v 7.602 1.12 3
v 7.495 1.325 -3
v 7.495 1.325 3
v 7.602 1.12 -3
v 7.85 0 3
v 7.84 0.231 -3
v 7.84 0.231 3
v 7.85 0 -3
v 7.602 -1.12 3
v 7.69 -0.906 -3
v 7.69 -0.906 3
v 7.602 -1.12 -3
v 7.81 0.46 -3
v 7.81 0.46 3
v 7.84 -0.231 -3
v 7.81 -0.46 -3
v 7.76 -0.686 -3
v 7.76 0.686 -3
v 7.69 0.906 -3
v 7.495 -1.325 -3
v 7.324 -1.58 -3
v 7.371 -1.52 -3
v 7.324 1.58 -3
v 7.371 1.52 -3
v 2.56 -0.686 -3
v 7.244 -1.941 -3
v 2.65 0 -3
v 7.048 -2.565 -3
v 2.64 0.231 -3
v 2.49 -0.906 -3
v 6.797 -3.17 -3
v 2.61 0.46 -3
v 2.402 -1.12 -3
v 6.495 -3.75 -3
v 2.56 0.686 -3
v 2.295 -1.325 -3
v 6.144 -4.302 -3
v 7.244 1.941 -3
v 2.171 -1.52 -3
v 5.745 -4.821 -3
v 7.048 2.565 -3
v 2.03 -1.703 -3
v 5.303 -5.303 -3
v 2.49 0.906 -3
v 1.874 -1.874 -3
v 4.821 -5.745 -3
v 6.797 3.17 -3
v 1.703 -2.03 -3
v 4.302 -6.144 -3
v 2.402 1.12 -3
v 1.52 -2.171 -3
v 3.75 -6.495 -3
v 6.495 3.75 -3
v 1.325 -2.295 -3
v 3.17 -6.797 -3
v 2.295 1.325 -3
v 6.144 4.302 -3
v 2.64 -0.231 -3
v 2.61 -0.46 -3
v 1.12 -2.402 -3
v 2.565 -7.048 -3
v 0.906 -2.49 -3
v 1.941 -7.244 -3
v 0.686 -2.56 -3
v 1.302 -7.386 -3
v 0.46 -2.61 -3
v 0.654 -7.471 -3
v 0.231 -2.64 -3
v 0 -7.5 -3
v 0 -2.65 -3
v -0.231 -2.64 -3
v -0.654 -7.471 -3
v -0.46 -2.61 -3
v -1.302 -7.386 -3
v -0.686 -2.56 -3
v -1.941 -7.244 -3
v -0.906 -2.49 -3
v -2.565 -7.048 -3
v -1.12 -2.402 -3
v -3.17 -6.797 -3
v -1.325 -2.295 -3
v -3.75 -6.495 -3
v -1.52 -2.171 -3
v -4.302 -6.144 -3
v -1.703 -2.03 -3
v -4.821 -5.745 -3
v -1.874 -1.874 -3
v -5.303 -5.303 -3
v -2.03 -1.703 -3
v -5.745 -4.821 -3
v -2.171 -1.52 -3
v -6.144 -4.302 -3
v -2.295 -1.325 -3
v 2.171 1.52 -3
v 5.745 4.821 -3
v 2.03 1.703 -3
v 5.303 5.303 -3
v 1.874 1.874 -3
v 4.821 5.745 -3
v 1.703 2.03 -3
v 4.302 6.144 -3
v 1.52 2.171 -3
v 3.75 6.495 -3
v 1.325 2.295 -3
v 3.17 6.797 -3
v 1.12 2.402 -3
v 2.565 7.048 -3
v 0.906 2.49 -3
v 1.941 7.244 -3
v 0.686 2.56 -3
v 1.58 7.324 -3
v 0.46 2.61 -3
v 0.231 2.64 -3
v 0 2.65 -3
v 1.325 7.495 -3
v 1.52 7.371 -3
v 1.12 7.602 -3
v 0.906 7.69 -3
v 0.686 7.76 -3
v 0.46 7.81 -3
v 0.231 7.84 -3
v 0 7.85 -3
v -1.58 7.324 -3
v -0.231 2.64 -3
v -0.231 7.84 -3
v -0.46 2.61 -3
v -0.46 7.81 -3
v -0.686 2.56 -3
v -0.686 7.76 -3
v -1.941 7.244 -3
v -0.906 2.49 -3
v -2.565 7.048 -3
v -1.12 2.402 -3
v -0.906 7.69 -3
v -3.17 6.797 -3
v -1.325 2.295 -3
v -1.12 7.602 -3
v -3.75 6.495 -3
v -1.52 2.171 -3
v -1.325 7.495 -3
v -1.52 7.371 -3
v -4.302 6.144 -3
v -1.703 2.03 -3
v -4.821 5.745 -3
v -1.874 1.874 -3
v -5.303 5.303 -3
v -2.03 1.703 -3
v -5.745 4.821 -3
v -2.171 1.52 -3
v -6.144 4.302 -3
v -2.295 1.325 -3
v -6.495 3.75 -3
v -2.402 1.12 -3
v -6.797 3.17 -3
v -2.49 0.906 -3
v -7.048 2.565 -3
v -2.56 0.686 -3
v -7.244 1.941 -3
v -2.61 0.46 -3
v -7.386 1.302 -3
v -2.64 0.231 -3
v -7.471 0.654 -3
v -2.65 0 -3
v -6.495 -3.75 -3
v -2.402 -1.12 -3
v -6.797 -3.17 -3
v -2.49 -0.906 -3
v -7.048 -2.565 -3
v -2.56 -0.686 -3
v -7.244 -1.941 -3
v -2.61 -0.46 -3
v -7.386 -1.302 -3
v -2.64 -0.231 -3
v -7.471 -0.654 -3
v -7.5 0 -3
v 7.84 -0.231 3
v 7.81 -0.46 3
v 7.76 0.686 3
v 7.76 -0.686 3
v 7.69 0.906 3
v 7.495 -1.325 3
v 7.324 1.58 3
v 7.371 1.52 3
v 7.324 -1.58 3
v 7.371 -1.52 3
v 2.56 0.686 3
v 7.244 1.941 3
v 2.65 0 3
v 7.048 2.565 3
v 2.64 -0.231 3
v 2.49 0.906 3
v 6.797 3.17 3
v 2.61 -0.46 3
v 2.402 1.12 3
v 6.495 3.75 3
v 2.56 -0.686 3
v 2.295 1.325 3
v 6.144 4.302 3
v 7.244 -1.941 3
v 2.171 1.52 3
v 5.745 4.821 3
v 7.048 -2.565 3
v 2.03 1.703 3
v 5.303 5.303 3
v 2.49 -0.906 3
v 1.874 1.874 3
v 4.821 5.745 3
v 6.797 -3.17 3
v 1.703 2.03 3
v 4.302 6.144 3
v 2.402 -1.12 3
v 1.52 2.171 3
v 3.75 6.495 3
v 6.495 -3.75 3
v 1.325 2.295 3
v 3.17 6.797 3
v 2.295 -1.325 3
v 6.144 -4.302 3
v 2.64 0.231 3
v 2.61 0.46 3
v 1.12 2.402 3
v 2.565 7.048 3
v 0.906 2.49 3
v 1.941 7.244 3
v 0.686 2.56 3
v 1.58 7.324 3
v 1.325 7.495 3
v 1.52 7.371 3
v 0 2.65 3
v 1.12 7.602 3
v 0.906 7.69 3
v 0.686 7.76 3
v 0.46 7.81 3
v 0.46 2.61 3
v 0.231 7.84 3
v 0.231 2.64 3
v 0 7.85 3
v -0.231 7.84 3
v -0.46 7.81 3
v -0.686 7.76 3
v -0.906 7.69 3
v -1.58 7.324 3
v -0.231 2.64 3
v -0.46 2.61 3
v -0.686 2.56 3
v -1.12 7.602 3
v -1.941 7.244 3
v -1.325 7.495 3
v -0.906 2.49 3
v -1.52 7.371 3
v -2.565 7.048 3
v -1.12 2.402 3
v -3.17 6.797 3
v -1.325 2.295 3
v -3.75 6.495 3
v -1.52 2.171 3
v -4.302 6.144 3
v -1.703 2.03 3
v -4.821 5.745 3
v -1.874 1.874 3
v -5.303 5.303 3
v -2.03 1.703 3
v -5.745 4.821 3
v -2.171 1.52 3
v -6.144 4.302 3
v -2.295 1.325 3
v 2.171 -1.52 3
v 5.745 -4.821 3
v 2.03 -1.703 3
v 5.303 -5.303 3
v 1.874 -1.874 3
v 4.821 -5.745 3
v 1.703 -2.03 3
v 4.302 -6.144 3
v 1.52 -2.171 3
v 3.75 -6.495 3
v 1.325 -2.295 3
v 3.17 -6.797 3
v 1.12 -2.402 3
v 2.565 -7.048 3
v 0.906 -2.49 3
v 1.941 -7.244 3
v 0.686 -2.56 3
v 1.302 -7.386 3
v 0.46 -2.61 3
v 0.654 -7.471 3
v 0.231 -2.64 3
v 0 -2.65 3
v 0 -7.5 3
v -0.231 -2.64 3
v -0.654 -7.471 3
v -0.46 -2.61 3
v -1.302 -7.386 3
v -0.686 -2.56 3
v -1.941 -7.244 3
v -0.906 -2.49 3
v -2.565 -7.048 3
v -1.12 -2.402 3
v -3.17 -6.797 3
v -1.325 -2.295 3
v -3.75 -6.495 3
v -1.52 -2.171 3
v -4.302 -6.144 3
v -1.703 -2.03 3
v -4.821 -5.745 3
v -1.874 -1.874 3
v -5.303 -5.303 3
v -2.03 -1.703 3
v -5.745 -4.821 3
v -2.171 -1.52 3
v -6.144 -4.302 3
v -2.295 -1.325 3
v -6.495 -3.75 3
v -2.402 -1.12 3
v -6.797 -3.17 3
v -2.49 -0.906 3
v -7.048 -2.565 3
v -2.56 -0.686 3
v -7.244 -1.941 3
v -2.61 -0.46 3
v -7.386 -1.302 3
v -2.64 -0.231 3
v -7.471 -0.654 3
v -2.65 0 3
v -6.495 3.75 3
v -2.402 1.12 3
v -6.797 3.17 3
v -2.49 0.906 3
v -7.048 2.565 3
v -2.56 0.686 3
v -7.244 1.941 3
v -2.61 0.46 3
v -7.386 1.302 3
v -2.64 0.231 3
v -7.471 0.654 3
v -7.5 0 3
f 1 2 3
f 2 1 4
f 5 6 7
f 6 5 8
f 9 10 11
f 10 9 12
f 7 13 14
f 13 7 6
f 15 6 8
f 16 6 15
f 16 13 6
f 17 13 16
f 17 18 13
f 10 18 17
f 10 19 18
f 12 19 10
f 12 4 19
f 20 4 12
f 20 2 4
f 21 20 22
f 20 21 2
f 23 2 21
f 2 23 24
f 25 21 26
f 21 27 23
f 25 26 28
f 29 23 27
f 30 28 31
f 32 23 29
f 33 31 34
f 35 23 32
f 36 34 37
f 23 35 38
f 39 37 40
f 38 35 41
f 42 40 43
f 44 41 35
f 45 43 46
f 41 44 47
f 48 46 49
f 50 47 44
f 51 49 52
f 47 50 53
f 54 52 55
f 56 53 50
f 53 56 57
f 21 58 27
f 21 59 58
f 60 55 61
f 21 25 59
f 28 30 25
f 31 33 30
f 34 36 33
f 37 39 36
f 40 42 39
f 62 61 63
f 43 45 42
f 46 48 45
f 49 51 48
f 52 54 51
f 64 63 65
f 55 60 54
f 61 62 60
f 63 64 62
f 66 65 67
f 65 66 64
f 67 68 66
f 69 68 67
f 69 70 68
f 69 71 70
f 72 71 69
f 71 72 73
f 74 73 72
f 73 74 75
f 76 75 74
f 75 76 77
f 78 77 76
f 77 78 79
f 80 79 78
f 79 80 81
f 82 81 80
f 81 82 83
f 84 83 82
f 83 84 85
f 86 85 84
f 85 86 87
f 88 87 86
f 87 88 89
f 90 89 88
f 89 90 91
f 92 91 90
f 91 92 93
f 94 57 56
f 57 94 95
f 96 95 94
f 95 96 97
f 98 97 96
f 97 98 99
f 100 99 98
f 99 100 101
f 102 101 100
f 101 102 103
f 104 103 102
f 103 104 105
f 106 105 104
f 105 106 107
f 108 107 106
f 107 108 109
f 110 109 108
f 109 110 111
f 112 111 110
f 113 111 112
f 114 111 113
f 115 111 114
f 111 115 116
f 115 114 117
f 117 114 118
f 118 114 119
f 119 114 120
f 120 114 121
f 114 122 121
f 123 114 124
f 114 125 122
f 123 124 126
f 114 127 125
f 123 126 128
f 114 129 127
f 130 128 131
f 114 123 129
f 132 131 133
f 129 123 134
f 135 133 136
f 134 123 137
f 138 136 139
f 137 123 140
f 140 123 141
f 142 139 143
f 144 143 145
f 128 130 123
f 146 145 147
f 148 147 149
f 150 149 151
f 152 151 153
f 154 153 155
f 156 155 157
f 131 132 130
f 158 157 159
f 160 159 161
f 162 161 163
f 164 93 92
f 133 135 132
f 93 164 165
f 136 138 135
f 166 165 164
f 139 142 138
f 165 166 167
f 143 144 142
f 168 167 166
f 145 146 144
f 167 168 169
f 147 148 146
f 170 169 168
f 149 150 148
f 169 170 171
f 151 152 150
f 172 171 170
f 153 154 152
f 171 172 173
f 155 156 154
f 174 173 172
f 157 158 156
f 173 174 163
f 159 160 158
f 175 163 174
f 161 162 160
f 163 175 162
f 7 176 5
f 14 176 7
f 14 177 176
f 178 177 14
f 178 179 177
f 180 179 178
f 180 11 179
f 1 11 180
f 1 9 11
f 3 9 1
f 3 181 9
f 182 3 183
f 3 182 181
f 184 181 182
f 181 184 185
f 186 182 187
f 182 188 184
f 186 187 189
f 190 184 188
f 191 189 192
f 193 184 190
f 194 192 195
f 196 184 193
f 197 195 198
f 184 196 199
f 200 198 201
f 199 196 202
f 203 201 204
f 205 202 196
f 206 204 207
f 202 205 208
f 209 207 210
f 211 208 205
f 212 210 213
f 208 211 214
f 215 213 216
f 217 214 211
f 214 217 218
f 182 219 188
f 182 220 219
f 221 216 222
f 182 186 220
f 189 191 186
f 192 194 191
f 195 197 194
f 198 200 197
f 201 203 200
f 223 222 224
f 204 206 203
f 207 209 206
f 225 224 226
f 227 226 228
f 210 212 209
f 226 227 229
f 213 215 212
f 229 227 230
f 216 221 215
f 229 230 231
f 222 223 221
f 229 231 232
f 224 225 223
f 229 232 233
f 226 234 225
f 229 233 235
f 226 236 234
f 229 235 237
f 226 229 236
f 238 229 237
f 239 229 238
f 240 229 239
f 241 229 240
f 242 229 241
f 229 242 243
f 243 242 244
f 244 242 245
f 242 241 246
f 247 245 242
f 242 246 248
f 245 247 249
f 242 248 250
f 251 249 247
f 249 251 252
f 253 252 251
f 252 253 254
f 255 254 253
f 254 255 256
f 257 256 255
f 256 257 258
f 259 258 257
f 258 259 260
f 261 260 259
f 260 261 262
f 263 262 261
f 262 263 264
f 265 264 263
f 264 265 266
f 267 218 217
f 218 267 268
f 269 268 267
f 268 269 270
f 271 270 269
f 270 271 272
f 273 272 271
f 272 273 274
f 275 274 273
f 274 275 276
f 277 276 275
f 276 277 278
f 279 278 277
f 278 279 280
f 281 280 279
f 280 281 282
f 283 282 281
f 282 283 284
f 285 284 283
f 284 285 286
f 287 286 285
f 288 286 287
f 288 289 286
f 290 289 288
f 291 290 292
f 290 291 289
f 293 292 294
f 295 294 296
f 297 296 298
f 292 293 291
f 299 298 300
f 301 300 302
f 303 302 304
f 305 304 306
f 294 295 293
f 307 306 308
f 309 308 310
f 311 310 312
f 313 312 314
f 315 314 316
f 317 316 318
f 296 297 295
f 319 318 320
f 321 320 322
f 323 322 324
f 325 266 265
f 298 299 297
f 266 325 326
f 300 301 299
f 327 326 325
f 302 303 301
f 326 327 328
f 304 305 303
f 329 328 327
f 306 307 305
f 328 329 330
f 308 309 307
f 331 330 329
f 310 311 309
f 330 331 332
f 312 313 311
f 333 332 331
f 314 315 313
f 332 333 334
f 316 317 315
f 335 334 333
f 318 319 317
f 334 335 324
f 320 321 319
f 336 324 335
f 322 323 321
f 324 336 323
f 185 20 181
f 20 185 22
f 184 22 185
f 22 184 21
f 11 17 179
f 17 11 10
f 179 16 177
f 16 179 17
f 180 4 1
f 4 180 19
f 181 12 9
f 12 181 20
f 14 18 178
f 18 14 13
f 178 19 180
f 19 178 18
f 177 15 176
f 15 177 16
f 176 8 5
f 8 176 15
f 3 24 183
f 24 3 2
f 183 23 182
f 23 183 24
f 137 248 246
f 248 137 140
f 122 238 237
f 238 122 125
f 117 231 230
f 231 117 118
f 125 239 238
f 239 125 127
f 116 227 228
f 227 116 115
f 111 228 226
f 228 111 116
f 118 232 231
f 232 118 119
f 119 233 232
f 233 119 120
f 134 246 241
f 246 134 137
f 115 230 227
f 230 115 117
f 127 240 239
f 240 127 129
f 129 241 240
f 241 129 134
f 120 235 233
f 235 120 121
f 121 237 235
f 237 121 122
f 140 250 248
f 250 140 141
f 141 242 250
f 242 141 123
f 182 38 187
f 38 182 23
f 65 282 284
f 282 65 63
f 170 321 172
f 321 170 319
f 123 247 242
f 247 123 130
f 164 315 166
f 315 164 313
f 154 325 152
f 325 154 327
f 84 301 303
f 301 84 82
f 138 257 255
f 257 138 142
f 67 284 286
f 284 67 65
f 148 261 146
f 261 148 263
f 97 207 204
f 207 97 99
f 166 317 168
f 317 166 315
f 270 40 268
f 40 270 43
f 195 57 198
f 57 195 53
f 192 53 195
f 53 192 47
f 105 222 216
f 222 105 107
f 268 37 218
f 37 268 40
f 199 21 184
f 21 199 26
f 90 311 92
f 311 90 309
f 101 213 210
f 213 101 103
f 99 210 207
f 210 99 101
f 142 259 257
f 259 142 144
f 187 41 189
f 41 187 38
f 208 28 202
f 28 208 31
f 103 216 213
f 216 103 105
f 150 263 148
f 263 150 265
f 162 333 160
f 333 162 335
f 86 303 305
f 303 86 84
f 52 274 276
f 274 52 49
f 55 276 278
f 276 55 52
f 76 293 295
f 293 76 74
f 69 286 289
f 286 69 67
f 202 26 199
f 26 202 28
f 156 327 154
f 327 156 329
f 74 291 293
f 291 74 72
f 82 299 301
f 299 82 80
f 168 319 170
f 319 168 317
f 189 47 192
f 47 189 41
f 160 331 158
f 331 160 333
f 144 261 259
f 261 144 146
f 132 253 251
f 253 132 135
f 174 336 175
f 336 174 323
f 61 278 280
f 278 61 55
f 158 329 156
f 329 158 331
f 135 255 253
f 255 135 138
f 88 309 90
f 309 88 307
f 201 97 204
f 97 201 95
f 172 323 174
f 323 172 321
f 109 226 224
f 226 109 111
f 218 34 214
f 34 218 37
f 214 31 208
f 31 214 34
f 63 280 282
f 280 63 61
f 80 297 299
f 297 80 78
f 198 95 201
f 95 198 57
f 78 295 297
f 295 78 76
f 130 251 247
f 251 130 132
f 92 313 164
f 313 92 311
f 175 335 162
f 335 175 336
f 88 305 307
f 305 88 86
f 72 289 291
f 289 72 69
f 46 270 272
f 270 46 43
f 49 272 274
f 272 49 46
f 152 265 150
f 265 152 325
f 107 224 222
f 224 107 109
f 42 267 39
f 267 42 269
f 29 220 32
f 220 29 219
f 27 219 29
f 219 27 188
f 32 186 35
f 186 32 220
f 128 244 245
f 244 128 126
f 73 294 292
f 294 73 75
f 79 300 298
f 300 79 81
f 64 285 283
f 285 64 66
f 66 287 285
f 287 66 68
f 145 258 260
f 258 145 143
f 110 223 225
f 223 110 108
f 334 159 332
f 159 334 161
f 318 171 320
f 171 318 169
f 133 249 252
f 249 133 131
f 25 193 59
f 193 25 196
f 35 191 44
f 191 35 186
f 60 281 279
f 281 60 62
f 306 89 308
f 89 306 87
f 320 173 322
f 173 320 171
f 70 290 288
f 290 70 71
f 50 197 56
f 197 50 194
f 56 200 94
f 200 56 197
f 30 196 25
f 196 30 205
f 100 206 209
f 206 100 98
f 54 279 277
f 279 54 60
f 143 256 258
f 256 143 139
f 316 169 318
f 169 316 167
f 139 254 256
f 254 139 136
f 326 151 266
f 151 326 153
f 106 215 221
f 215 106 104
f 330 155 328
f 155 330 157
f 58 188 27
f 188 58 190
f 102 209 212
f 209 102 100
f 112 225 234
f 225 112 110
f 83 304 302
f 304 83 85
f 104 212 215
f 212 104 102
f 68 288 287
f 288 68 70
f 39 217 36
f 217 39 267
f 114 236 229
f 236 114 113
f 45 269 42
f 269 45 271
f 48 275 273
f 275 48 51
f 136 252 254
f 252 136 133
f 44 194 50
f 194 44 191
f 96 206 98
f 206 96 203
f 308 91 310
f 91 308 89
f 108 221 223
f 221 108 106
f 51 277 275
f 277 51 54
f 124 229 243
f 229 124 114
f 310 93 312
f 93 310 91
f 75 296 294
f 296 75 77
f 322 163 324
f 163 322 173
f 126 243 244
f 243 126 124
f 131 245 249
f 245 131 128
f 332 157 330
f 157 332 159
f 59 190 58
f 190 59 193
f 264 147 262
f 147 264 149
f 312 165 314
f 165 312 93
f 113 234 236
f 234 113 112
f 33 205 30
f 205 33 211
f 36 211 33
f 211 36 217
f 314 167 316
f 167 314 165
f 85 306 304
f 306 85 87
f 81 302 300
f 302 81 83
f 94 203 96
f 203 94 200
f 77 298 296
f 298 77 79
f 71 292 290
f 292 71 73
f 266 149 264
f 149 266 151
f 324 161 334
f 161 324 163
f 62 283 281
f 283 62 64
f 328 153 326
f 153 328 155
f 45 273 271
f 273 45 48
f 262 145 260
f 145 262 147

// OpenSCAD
// K'NEX Red 2-Way 90° Connector
$fn = 72;

hub_r = 7.5;
hub_h = 6.0;
arm_w = 5.3;
arm_h = 6.0;
arm_len = 12.7;
hole_r = 2.65;
slot_w = 1.2;

module arm() {
    difference() {
        hull() {
            cylinder(h=arm_h, r=arm_w/2, center=true);
            translate([arm_len - hub_r, 0, 0])
                cylinder(h=arm_h, r=arm_w/2, center=true);
        }
        translate([arm_len, 0, 0])
            cylinder(h=arm_h+2, r=hole_r, center=true);
        translate([arm_len, 0, 0]) {
            translate([0, 0, arm_h/2])
                cube([slot_w, hole_r*2+1, 2], center=true);
            translate([0, 0, -arm_h/2])
                cube([slot_w, hole_r*2+1, 2], center=true);
        }
    }
}

module connector_2way_90() {
    difference() {
        union() {
            cylinder(h=hub_h, r=hub_r, center=true);
            arm();
            rotate([0, 0, 90]) arm();
        }
        cylinder(h=hub_h+2, r=hole_r, center=true);
    }
}

connector_2way_90();
